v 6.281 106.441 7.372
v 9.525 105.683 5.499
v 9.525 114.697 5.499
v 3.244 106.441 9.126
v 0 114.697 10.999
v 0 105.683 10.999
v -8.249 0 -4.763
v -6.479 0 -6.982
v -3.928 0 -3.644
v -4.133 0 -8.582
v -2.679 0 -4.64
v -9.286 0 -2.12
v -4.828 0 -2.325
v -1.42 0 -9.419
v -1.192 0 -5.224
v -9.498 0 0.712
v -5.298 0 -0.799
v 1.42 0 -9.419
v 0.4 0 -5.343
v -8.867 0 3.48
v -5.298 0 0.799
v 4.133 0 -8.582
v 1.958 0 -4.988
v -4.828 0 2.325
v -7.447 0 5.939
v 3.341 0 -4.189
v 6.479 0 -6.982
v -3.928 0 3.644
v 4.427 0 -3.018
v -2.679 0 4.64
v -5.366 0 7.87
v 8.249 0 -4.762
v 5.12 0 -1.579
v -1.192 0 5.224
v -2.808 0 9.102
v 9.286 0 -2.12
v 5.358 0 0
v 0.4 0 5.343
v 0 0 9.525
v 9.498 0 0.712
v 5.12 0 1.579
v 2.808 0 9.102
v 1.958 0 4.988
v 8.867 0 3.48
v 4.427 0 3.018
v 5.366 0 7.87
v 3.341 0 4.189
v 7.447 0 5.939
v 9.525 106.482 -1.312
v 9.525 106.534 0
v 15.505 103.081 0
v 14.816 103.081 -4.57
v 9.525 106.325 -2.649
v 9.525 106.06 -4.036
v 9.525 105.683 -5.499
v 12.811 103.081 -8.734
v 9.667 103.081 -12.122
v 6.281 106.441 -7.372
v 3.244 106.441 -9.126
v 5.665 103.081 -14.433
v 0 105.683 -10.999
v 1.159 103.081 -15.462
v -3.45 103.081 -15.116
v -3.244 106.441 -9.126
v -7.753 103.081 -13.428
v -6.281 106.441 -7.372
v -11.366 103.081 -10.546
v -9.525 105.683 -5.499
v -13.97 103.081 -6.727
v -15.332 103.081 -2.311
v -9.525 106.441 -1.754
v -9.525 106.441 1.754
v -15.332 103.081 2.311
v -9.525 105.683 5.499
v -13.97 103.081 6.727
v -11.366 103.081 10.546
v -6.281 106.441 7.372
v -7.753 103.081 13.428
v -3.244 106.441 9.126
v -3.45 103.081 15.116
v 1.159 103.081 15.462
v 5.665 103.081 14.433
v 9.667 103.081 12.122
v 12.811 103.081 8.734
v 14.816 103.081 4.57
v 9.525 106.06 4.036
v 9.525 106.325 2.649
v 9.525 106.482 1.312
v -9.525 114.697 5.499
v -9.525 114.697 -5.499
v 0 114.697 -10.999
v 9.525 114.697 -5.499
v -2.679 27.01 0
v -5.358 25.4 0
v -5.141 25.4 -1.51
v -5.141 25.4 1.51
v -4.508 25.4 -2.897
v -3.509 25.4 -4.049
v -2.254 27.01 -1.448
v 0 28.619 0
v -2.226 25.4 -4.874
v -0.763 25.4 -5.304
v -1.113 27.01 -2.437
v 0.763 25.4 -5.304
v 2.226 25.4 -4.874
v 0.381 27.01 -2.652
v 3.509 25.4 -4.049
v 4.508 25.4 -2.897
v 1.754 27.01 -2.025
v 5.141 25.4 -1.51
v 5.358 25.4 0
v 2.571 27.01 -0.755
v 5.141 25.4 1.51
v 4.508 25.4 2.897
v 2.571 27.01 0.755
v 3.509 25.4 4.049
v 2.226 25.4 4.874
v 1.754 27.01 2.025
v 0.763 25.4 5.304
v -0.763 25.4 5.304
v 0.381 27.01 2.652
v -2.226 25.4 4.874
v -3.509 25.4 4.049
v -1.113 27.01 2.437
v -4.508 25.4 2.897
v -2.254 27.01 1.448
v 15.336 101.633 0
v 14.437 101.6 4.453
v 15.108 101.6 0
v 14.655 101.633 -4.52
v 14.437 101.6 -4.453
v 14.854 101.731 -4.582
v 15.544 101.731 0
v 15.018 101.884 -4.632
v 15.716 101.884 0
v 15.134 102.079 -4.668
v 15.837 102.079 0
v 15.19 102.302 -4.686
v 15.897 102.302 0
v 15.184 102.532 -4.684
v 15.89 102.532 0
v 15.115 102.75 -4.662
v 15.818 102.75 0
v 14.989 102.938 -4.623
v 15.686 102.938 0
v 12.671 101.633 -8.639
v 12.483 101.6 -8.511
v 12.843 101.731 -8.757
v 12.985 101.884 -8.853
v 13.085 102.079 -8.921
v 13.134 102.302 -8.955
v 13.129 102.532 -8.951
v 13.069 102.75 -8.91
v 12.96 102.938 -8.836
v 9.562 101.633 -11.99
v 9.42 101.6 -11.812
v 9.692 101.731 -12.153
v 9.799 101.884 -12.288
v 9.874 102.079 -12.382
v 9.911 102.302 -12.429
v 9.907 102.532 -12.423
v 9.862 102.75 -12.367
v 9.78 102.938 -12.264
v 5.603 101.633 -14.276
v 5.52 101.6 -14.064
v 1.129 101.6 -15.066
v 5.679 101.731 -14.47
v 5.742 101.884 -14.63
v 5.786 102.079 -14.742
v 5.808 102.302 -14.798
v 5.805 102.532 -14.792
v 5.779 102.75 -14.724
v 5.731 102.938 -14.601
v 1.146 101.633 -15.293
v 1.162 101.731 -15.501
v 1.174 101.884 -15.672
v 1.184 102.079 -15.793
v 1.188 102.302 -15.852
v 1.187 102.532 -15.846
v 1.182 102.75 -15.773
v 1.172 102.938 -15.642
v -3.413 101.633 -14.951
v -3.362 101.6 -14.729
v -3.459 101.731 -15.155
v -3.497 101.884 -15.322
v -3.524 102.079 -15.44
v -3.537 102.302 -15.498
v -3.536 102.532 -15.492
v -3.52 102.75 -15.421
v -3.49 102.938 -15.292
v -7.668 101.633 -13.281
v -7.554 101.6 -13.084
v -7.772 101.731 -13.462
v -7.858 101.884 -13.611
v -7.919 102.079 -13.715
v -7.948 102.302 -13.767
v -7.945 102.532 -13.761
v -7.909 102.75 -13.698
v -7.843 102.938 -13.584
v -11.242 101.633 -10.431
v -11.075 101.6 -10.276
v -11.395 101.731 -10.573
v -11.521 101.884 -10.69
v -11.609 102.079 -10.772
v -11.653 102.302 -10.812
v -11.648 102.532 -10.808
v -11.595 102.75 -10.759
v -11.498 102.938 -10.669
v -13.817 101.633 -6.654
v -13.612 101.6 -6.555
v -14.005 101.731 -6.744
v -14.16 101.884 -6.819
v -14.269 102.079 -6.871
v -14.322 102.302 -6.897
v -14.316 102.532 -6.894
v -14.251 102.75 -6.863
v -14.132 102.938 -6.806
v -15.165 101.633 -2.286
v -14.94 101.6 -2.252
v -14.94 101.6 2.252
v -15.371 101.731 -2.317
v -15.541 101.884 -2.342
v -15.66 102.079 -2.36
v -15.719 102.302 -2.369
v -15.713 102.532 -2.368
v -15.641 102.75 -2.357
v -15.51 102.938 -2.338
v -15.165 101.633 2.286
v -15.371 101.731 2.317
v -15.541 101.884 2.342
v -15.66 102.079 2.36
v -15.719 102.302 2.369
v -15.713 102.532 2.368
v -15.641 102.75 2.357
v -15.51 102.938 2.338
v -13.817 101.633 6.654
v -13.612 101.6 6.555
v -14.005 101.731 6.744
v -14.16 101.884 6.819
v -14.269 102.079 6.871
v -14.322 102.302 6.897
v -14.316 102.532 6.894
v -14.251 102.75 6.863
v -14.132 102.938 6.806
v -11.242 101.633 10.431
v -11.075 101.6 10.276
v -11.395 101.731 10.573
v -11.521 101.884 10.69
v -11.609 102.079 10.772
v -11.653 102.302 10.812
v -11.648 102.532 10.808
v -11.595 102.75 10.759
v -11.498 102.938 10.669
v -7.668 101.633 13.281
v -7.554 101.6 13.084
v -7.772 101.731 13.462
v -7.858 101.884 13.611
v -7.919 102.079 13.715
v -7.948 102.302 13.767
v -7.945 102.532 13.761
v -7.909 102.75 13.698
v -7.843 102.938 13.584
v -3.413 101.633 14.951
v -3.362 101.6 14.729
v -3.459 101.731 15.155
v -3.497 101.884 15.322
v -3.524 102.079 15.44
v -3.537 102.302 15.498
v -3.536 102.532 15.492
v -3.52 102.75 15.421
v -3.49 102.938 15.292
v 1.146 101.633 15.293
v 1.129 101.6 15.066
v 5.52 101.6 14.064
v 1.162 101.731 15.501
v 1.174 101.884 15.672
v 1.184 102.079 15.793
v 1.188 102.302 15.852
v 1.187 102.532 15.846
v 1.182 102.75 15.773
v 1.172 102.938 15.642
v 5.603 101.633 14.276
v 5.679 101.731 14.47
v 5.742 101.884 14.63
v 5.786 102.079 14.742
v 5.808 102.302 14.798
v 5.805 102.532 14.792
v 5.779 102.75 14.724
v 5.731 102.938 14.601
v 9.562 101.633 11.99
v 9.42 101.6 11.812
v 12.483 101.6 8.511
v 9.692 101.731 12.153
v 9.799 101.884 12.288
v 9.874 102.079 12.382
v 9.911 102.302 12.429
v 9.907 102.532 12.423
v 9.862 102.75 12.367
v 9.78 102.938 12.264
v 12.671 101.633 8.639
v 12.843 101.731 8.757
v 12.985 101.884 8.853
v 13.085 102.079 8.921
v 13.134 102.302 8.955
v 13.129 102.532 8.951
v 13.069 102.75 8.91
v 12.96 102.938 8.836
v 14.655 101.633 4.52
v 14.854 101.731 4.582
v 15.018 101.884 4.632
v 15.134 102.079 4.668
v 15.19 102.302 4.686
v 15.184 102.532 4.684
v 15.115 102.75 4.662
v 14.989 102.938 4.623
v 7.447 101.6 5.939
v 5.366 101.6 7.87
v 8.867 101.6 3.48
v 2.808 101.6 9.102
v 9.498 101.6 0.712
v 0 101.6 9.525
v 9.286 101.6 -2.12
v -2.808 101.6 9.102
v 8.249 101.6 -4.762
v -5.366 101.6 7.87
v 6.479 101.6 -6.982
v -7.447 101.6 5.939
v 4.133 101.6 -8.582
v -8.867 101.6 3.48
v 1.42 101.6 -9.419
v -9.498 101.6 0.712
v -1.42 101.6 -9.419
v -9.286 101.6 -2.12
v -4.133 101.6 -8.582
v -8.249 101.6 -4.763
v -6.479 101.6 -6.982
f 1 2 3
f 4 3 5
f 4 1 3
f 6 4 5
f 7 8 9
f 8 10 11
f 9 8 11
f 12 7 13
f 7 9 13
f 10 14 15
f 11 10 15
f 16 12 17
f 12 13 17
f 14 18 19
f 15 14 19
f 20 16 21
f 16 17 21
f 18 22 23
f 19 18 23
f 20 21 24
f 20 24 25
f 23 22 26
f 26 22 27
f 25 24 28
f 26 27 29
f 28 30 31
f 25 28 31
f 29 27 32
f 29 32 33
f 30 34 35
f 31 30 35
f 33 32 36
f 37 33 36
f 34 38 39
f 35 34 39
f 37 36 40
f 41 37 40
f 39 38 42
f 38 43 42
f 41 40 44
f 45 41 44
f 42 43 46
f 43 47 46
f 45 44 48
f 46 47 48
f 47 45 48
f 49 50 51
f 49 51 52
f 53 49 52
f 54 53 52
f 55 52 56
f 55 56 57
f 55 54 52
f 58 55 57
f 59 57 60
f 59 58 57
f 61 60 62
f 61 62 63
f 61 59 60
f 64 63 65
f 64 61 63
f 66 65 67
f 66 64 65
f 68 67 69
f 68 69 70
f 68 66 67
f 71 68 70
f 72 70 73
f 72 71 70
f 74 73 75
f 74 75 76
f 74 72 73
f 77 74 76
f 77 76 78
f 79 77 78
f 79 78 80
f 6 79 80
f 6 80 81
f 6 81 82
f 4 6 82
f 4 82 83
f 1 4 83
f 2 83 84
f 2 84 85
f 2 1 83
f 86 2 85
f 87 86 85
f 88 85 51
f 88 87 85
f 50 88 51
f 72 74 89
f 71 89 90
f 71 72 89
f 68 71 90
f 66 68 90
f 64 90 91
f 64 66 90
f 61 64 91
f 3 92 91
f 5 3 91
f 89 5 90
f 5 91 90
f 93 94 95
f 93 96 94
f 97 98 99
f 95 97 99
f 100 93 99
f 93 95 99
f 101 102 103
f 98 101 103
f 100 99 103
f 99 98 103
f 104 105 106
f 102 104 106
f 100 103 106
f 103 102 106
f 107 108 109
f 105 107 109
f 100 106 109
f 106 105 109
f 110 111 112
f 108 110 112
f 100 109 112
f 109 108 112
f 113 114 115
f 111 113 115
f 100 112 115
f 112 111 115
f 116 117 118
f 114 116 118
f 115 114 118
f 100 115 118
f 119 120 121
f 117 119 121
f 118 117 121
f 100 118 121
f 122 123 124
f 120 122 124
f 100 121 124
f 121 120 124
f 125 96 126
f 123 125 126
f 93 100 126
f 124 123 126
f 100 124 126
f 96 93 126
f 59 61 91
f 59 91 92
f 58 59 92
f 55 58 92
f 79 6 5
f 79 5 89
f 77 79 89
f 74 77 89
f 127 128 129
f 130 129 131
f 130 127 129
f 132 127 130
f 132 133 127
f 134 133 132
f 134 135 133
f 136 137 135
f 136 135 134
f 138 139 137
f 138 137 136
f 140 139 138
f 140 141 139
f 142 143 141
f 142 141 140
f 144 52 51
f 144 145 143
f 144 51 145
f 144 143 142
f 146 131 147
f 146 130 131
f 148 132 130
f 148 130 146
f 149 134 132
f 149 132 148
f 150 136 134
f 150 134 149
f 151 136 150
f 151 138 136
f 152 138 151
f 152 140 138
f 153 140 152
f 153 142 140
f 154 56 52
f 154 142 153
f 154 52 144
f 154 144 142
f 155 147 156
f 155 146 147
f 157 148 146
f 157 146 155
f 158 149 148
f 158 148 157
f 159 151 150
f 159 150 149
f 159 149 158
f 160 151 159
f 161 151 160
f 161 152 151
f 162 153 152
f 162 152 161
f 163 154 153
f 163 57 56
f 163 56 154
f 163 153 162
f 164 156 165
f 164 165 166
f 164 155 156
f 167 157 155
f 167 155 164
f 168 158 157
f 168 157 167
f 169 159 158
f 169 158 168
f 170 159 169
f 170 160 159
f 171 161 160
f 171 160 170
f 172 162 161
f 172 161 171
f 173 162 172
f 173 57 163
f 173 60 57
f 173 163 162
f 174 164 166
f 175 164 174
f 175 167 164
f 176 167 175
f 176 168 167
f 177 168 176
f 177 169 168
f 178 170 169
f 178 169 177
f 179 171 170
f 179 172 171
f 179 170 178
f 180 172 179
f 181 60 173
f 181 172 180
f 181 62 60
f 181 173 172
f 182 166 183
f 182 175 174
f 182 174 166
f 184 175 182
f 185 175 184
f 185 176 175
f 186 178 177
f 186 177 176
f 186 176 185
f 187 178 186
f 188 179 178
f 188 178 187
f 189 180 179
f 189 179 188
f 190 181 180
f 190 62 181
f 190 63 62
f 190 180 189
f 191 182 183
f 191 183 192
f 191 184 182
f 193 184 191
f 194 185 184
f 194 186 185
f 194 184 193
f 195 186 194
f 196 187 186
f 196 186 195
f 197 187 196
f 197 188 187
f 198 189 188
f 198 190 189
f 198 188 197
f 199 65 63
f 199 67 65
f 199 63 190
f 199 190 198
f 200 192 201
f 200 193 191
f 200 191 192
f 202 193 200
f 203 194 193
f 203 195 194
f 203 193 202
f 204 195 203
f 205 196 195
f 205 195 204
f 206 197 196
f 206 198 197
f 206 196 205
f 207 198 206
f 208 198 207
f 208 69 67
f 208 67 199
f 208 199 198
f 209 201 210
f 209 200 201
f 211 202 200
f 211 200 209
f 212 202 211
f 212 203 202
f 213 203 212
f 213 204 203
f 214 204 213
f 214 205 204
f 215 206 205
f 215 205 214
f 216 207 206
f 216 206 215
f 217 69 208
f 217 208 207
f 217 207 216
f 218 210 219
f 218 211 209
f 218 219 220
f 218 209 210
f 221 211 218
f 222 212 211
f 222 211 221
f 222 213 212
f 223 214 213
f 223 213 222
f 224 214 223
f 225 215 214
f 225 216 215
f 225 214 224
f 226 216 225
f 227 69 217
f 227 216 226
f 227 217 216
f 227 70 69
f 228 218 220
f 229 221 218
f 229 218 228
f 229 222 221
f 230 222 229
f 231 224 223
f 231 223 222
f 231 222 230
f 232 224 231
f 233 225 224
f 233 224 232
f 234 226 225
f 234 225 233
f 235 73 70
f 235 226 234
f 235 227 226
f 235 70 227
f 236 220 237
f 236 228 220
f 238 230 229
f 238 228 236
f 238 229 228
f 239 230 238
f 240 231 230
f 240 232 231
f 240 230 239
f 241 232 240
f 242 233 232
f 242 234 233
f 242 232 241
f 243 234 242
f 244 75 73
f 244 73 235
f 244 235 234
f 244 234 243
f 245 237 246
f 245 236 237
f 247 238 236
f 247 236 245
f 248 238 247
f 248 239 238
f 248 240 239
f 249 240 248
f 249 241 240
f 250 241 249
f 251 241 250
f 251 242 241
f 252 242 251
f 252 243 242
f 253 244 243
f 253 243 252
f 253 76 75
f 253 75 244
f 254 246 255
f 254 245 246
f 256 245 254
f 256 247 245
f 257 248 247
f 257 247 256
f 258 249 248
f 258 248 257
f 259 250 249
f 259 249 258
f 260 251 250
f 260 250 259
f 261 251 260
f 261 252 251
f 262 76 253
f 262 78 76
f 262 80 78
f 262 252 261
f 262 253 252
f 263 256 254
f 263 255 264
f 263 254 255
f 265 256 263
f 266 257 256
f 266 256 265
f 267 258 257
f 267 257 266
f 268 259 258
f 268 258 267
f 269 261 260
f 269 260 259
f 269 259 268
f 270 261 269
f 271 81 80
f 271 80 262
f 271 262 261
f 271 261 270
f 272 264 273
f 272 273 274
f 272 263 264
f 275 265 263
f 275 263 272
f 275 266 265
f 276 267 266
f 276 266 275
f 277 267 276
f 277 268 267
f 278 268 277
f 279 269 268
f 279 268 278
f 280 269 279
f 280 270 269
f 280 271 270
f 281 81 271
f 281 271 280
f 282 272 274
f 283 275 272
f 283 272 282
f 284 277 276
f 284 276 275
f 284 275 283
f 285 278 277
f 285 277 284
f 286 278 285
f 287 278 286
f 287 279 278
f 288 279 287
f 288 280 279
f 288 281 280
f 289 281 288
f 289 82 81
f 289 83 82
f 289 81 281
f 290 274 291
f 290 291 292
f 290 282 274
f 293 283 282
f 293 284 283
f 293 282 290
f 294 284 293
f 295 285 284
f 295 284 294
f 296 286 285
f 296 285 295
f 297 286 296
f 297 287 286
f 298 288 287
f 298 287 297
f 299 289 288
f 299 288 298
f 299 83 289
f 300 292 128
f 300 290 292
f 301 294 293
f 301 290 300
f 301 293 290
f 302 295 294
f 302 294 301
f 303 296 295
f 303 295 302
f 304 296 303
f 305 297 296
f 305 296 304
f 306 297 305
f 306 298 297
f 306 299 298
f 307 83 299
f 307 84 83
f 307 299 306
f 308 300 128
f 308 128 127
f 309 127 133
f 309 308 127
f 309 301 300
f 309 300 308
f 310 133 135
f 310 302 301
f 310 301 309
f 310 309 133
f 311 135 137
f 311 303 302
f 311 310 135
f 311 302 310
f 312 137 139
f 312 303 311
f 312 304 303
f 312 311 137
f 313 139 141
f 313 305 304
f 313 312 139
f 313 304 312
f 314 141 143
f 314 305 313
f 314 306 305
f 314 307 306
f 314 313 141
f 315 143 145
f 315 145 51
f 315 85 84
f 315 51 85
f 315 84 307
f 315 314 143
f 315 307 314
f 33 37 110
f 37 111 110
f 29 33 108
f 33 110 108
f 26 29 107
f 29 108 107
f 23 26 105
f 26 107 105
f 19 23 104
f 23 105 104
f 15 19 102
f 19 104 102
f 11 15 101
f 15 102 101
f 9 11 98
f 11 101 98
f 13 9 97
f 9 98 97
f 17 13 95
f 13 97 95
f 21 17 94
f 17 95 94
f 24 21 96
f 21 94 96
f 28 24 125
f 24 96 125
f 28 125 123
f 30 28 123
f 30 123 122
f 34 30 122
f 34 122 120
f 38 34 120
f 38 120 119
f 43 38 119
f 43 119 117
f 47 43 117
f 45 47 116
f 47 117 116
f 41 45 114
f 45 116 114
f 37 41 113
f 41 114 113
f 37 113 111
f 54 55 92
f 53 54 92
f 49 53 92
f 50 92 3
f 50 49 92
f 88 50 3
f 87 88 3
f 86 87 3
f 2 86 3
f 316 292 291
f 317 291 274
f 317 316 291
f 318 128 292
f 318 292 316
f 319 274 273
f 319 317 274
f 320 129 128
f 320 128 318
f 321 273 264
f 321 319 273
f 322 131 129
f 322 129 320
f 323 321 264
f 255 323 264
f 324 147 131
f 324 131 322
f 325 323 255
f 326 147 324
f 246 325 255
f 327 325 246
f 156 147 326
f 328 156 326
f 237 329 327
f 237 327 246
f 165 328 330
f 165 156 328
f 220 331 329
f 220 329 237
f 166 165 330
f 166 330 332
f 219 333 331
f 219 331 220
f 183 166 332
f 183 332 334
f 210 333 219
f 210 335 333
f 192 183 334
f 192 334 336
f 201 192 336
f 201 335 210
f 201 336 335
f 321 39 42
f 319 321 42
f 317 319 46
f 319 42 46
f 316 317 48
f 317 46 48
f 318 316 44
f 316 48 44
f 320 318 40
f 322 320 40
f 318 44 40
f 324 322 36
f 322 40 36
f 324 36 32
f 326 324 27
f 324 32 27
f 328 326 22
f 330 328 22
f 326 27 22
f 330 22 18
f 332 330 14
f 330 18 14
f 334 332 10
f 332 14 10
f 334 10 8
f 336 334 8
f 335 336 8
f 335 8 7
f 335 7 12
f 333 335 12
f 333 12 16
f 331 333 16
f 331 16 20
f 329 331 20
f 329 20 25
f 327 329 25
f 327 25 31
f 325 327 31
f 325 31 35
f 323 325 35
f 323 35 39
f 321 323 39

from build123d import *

# Parameters (mm, degrees)
SKETCH1_R                   = 9.525
BOSS_EXTRUDE1_DEPTH         = 101.6
BOSS_EXTRUDE2_DEPTH         = 13.096875
F_1_2_13_TAPPED_HOLE1_D     = 10.71626
F_1_2_13_TAPPED_HOLE1_DEPTH = 25.4
F_1_2_13_TAPPED_HOLE1_TIP   = 3.219489309


with BuildPart() as part:
    # Sketch1 → Boss-Extrude1 (new body)
    with BuildSketch(Plane(origin=(0, 0, 0), x_dir=(1, 0, 0), z_dir=(0, 1, 0))):
        with Locations(Location((0, 0, 0), (0, 0, 270))):
            Circle(SKETCH1_R)
    extrude(amount=BOSS_EXTRUDE1_DEPTH)

    # Sketch4 → Boss-Extrude2 (add)
    with BuildSketch(Plane(origin=(0, 101.6, 0), x_dir=(1, 0, 0), z_dir=(0, 1, 0))):
        Polygon((0, 10.998522628), (9.525, 5.499261314), (9.525, -5.499261314), (0, -10.998522628), (-9.525, -5.499261314), (-9.525, 5.499261314), align=None)
    extrude(amount=BOSS_EXTRUDE2_DEPTH)

    # Sketch5 → Revolve2 (revolve)
    with BuildSketch(Plane.XY, mode=Mode.PRIVATE) as revolve2_sk:
        with BuildLine():
            Line((0, 101.6), (-15.108296375, 101.6))
            ThreePointArc((-15.108296375, 101.6), (-15.875, 102.188312383), (-15.505171375, 103.081157664))
            Line((-15.505171375, 103.081157664), (0, 112.033072532))
            Line((0, 112.033072532), (0, 101.6))
        make_face()
    revolve(revolve2_sk.sketch.rotate(Axis((0, 101.6, 0), (0, 1, 0)), 180), axis=Axis((0, 101.6, 0), (0, 1, 0)))

    # 1/2-13 Tapped Hole1
    with Locations(Plane(origin=(0, 0, 0), x_dir=(-1, 0, 0), z_dir=(0, -1, 0))):
        with Locations((0, 0)):
            Hole(F_1_2_13_TAPPED_HOLE1_D / 2, depth=F_1_2_13_TAPPED_HOLE1_DEPTH)
            with Locations((0, 0, -(F_1_2_13_TAPPED_HOLE1_DEPTH + F_1_2_13_TAPPED_HOLE1_TIP / 2))):  # 118° drill point
                Cone(0, F_1_2_13_TAPPED_HOLE1_D / 2, F_1_2_13_TAPPED_HOLE1_TIP, mode=Mode.SUBTRACT)


solid = part.part
